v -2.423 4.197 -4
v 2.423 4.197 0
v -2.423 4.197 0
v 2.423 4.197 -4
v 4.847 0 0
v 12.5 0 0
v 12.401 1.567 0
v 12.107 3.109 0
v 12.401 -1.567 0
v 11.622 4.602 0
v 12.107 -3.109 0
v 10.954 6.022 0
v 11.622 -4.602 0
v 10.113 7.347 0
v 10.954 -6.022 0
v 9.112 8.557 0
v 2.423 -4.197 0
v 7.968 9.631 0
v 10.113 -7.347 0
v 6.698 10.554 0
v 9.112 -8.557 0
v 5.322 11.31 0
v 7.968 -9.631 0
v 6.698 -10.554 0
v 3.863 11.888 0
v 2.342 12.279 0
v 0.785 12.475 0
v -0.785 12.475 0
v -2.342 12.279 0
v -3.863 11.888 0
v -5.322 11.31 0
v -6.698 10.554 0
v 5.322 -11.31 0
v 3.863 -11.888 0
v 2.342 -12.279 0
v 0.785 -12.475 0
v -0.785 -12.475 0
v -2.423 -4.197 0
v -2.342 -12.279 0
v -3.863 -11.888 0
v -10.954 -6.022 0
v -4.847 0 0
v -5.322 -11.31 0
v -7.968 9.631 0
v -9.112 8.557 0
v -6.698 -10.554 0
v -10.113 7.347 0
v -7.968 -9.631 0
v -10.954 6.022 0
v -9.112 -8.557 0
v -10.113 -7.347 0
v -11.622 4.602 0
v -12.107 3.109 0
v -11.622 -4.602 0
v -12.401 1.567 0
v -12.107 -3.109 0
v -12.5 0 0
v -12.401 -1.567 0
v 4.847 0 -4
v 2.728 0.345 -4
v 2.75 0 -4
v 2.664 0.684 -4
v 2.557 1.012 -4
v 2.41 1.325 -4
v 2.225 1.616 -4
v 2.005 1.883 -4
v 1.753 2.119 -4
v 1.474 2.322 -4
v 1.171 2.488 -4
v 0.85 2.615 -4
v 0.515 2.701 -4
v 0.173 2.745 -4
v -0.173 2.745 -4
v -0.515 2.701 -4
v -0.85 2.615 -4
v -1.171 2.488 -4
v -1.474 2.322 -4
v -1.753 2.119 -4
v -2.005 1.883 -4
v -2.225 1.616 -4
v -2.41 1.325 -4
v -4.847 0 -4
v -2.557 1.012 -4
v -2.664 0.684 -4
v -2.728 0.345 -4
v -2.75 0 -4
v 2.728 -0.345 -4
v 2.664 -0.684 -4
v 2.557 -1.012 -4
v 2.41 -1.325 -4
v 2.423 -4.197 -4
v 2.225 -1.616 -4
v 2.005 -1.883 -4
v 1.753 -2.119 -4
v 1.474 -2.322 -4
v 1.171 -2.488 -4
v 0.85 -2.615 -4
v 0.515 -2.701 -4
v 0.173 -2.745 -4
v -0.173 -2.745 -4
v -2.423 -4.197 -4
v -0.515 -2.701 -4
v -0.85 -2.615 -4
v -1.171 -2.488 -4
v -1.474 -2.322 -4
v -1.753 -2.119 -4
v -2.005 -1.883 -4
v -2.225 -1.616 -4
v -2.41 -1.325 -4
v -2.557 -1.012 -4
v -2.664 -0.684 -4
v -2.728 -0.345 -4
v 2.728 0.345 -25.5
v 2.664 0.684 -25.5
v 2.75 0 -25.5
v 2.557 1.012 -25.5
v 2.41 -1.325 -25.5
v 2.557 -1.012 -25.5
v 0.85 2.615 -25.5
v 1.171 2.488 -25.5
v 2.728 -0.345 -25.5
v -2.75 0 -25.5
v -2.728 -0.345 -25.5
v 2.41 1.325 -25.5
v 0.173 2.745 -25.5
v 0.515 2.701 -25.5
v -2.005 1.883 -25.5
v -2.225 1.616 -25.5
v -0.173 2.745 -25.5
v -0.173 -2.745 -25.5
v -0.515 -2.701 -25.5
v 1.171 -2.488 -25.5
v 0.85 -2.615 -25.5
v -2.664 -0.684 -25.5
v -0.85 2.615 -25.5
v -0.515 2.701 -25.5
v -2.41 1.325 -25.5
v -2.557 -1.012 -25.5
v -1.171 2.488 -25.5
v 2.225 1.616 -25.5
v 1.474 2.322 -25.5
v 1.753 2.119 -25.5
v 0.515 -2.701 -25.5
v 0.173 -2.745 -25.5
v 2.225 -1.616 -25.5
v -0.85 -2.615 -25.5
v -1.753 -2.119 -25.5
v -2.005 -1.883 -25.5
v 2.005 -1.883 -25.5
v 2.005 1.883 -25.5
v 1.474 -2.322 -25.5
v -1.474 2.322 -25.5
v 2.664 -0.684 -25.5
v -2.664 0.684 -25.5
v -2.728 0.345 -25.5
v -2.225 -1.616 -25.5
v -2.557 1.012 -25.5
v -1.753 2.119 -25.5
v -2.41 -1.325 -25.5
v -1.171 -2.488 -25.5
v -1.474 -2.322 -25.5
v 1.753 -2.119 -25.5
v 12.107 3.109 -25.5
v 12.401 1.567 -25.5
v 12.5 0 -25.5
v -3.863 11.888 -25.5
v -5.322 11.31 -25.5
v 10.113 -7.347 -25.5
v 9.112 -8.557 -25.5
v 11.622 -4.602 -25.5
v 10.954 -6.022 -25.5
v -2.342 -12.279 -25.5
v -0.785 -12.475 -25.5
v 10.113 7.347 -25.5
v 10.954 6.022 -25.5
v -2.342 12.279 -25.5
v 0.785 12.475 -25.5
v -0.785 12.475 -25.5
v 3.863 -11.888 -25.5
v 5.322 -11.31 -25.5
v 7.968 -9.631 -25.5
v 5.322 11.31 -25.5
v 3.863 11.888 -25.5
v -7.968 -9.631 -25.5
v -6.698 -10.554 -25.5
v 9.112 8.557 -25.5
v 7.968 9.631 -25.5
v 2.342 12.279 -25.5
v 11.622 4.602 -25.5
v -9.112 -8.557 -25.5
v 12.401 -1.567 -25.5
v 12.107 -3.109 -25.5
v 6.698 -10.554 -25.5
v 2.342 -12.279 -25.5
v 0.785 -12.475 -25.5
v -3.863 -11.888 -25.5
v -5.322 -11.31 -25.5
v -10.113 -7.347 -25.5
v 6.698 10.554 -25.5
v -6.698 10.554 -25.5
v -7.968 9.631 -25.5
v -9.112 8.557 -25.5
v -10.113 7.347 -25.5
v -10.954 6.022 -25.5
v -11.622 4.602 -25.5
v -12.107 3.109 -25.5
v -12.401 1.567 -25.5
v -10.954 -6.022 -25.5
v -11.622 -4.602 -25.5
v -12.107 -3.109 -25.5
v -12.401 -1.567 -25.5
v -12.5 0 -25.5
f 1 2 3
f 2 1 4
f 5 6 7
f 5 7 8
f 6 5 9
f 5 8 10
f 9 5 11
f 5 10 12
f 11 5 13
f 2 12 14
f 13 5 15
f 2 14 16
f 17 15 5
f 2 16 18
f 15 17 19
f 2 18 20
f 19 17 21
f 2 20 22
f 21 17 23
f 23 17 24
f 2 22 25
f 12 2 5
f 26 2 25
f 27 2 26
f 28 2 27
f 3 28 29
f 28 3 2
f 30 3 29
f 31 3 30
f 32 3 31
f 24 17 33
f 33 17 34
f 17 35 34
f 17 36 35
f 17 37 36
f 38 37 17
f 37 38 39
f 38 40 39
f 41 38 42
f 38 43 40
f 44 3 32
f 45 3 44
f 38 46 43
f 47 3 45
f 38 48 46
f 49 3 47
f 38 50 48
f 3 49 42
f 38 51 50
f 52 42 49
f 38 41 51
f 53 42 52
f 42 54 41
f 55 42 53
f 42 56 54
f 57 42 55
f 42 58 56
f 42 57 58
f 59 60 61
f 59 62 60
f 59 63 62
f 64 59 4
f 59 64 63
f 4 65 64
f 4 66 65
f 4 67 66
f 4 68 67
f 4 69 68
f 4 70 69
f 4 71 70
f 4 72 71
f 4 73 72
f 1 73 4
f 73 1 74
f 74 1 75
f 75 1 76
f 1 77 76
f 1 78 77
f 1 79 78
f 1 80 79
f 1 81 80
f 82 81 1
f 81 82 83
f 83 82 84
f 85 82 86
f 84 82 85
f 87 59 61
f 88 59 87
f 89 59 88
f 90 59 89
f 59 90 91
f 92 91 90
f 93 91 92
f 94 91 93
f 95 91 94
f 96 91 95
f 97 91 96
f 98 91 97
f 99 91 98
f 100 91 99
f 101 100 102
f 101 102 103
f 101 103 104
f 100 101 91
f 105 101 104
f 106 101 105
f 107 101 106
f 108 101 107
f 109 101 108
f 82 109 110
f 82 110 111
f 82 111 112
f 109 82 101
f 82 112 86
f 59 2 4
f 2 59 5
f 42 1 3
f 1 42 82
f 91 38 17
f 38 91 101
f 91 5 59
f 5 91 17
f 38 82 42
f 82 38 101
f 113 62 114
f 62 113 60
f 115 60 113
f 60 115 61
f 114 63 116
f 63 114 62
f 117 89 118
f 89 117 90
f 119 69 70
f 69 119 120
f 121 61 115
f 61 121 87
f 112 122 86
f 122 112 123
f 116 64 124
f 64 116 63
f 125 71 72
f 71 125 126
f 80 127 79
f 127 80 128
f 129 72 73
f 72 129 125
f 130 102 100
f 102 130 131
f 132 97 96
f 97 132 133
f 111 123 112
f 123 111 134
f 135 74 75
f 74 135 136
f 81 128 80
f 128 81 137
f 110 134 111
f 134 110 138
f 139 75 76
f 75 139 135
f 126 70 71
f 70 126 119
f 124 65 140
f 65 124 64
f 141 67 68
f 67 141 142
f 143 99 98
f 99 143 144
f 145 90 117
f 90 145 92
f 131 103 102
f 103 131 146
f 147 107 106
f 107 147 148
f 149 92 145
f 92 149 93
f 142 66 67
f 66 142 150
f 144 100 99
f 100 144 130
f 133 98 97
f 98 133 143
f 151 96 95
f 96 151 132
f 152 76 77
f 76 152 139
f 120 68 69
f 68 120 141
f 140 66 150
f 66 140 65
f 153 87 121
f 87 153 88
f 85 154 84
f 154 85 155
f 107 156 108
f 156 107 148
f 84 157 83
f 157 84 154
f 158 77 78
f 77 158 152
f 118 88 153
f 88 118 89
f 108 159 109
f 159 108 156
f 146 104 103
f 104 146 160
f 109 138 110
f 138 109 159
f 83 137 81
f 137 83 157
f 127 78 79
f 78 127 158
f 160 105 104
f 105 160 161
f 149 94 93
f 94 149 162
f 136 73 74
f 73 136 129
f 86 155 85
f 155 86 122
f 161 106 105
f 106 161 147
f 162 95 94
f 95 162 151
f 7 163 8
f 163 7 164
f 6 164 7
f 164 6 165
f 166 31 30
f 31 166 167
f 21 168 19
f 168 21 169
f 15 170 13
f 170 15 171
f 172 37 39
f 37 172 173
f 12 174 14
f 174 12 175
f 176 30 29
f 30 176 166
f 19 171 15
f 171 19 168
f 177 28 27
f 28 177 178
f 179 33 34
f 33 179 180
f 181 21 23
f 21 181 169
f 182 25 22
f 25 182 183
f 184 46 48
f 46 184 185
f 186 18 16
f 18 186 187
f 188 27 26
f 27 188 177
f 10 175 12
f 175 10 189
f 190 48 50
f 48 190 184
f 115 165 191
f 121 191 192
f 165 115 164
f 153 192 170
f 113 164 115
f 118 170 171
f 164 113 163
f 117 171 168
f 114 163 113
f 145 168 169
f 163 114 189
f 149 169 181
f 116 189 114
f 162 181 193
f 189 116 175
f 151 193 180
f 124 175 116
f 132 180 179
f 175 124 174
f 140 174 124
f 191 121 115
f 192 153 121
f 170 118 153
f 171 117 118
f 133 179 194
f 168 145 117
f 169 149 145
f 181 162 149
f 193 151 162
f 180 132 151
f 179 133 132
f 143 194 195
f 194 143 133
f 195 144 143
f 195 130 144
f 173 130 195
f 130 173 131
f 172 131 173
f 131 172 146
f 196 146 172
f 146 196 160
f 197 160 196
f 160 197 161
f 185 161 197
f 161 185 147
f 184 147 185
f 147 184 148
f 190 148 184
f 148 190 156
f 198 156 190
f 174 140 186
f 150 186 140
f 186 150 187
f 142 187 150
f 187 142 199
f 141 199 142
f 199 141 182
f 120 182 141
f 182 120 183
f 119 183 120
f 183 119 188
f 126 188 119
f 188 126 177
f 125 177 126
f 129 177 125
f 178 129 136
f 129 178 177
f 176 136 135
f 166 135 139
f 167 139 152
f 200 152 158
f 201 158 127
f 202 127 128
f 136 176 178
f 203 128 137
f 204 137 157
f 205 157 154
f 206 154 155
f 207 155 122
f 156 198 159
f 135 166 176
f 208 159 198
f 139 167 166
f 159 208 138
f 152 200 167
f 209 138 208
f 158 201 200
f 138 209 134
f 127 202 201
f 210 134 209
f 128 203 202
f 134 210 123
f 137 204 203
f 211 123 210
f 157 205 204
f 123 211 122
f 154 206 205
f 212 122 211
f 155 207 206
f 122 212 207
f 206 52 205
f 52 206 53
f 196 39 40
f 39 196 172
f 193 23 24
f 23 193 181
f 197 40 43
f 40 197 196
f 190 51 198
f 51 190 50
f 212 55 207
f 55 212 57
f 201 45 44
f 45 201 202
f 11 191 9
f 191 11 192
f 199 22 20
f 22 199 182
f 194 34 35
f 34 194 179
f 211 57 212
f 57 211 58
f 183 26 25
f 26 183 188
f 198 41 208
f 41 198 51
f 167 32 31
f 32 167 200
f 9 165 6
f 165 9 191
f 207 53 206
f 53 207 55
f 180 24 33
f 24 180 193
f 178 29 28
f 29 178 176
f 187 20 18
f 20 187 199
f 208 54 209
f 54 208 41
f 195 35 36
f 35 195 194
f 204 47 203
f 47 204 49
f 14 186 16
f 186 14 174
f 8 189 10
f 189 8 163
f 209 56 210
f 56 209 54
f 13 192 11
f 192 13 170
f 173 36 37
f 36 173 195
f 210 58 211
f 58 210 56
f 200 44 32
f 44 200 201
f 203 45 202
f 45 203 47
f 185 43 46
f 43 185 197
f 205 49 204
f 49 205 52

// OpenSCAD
$fn = 50;

difference() {
	union() {
		translate(v = [0, 0, -25.5]) {
			cylinder(h = 25.5, r = 12.5);
		}
	}
	union() {
		translate(v = [0, 0, 0]) {
			rotate(a = [0, 0, 0]) {
				difference() {
					union() {
						translate(v = [0, 0, -4]) {
							linear_extrude(height = 4) {
								polygon(points = [[4.8468, 0.0], [2.4234000000000004, 4.197451927062417], [-2.423399999999999, 4.197451927062417], [-4.8468, 5.935618106107392e-16], [-2.423400000000002, -4.197451927062416], [2.423399999999997, -4.197451927062419]]);
							}
						}
					}
					union();
				}
			}
		}
		#translate(v = [0, 0, -100.0]) {
			cylinder(h = 200, r = 2.75);
		}
	}
}
